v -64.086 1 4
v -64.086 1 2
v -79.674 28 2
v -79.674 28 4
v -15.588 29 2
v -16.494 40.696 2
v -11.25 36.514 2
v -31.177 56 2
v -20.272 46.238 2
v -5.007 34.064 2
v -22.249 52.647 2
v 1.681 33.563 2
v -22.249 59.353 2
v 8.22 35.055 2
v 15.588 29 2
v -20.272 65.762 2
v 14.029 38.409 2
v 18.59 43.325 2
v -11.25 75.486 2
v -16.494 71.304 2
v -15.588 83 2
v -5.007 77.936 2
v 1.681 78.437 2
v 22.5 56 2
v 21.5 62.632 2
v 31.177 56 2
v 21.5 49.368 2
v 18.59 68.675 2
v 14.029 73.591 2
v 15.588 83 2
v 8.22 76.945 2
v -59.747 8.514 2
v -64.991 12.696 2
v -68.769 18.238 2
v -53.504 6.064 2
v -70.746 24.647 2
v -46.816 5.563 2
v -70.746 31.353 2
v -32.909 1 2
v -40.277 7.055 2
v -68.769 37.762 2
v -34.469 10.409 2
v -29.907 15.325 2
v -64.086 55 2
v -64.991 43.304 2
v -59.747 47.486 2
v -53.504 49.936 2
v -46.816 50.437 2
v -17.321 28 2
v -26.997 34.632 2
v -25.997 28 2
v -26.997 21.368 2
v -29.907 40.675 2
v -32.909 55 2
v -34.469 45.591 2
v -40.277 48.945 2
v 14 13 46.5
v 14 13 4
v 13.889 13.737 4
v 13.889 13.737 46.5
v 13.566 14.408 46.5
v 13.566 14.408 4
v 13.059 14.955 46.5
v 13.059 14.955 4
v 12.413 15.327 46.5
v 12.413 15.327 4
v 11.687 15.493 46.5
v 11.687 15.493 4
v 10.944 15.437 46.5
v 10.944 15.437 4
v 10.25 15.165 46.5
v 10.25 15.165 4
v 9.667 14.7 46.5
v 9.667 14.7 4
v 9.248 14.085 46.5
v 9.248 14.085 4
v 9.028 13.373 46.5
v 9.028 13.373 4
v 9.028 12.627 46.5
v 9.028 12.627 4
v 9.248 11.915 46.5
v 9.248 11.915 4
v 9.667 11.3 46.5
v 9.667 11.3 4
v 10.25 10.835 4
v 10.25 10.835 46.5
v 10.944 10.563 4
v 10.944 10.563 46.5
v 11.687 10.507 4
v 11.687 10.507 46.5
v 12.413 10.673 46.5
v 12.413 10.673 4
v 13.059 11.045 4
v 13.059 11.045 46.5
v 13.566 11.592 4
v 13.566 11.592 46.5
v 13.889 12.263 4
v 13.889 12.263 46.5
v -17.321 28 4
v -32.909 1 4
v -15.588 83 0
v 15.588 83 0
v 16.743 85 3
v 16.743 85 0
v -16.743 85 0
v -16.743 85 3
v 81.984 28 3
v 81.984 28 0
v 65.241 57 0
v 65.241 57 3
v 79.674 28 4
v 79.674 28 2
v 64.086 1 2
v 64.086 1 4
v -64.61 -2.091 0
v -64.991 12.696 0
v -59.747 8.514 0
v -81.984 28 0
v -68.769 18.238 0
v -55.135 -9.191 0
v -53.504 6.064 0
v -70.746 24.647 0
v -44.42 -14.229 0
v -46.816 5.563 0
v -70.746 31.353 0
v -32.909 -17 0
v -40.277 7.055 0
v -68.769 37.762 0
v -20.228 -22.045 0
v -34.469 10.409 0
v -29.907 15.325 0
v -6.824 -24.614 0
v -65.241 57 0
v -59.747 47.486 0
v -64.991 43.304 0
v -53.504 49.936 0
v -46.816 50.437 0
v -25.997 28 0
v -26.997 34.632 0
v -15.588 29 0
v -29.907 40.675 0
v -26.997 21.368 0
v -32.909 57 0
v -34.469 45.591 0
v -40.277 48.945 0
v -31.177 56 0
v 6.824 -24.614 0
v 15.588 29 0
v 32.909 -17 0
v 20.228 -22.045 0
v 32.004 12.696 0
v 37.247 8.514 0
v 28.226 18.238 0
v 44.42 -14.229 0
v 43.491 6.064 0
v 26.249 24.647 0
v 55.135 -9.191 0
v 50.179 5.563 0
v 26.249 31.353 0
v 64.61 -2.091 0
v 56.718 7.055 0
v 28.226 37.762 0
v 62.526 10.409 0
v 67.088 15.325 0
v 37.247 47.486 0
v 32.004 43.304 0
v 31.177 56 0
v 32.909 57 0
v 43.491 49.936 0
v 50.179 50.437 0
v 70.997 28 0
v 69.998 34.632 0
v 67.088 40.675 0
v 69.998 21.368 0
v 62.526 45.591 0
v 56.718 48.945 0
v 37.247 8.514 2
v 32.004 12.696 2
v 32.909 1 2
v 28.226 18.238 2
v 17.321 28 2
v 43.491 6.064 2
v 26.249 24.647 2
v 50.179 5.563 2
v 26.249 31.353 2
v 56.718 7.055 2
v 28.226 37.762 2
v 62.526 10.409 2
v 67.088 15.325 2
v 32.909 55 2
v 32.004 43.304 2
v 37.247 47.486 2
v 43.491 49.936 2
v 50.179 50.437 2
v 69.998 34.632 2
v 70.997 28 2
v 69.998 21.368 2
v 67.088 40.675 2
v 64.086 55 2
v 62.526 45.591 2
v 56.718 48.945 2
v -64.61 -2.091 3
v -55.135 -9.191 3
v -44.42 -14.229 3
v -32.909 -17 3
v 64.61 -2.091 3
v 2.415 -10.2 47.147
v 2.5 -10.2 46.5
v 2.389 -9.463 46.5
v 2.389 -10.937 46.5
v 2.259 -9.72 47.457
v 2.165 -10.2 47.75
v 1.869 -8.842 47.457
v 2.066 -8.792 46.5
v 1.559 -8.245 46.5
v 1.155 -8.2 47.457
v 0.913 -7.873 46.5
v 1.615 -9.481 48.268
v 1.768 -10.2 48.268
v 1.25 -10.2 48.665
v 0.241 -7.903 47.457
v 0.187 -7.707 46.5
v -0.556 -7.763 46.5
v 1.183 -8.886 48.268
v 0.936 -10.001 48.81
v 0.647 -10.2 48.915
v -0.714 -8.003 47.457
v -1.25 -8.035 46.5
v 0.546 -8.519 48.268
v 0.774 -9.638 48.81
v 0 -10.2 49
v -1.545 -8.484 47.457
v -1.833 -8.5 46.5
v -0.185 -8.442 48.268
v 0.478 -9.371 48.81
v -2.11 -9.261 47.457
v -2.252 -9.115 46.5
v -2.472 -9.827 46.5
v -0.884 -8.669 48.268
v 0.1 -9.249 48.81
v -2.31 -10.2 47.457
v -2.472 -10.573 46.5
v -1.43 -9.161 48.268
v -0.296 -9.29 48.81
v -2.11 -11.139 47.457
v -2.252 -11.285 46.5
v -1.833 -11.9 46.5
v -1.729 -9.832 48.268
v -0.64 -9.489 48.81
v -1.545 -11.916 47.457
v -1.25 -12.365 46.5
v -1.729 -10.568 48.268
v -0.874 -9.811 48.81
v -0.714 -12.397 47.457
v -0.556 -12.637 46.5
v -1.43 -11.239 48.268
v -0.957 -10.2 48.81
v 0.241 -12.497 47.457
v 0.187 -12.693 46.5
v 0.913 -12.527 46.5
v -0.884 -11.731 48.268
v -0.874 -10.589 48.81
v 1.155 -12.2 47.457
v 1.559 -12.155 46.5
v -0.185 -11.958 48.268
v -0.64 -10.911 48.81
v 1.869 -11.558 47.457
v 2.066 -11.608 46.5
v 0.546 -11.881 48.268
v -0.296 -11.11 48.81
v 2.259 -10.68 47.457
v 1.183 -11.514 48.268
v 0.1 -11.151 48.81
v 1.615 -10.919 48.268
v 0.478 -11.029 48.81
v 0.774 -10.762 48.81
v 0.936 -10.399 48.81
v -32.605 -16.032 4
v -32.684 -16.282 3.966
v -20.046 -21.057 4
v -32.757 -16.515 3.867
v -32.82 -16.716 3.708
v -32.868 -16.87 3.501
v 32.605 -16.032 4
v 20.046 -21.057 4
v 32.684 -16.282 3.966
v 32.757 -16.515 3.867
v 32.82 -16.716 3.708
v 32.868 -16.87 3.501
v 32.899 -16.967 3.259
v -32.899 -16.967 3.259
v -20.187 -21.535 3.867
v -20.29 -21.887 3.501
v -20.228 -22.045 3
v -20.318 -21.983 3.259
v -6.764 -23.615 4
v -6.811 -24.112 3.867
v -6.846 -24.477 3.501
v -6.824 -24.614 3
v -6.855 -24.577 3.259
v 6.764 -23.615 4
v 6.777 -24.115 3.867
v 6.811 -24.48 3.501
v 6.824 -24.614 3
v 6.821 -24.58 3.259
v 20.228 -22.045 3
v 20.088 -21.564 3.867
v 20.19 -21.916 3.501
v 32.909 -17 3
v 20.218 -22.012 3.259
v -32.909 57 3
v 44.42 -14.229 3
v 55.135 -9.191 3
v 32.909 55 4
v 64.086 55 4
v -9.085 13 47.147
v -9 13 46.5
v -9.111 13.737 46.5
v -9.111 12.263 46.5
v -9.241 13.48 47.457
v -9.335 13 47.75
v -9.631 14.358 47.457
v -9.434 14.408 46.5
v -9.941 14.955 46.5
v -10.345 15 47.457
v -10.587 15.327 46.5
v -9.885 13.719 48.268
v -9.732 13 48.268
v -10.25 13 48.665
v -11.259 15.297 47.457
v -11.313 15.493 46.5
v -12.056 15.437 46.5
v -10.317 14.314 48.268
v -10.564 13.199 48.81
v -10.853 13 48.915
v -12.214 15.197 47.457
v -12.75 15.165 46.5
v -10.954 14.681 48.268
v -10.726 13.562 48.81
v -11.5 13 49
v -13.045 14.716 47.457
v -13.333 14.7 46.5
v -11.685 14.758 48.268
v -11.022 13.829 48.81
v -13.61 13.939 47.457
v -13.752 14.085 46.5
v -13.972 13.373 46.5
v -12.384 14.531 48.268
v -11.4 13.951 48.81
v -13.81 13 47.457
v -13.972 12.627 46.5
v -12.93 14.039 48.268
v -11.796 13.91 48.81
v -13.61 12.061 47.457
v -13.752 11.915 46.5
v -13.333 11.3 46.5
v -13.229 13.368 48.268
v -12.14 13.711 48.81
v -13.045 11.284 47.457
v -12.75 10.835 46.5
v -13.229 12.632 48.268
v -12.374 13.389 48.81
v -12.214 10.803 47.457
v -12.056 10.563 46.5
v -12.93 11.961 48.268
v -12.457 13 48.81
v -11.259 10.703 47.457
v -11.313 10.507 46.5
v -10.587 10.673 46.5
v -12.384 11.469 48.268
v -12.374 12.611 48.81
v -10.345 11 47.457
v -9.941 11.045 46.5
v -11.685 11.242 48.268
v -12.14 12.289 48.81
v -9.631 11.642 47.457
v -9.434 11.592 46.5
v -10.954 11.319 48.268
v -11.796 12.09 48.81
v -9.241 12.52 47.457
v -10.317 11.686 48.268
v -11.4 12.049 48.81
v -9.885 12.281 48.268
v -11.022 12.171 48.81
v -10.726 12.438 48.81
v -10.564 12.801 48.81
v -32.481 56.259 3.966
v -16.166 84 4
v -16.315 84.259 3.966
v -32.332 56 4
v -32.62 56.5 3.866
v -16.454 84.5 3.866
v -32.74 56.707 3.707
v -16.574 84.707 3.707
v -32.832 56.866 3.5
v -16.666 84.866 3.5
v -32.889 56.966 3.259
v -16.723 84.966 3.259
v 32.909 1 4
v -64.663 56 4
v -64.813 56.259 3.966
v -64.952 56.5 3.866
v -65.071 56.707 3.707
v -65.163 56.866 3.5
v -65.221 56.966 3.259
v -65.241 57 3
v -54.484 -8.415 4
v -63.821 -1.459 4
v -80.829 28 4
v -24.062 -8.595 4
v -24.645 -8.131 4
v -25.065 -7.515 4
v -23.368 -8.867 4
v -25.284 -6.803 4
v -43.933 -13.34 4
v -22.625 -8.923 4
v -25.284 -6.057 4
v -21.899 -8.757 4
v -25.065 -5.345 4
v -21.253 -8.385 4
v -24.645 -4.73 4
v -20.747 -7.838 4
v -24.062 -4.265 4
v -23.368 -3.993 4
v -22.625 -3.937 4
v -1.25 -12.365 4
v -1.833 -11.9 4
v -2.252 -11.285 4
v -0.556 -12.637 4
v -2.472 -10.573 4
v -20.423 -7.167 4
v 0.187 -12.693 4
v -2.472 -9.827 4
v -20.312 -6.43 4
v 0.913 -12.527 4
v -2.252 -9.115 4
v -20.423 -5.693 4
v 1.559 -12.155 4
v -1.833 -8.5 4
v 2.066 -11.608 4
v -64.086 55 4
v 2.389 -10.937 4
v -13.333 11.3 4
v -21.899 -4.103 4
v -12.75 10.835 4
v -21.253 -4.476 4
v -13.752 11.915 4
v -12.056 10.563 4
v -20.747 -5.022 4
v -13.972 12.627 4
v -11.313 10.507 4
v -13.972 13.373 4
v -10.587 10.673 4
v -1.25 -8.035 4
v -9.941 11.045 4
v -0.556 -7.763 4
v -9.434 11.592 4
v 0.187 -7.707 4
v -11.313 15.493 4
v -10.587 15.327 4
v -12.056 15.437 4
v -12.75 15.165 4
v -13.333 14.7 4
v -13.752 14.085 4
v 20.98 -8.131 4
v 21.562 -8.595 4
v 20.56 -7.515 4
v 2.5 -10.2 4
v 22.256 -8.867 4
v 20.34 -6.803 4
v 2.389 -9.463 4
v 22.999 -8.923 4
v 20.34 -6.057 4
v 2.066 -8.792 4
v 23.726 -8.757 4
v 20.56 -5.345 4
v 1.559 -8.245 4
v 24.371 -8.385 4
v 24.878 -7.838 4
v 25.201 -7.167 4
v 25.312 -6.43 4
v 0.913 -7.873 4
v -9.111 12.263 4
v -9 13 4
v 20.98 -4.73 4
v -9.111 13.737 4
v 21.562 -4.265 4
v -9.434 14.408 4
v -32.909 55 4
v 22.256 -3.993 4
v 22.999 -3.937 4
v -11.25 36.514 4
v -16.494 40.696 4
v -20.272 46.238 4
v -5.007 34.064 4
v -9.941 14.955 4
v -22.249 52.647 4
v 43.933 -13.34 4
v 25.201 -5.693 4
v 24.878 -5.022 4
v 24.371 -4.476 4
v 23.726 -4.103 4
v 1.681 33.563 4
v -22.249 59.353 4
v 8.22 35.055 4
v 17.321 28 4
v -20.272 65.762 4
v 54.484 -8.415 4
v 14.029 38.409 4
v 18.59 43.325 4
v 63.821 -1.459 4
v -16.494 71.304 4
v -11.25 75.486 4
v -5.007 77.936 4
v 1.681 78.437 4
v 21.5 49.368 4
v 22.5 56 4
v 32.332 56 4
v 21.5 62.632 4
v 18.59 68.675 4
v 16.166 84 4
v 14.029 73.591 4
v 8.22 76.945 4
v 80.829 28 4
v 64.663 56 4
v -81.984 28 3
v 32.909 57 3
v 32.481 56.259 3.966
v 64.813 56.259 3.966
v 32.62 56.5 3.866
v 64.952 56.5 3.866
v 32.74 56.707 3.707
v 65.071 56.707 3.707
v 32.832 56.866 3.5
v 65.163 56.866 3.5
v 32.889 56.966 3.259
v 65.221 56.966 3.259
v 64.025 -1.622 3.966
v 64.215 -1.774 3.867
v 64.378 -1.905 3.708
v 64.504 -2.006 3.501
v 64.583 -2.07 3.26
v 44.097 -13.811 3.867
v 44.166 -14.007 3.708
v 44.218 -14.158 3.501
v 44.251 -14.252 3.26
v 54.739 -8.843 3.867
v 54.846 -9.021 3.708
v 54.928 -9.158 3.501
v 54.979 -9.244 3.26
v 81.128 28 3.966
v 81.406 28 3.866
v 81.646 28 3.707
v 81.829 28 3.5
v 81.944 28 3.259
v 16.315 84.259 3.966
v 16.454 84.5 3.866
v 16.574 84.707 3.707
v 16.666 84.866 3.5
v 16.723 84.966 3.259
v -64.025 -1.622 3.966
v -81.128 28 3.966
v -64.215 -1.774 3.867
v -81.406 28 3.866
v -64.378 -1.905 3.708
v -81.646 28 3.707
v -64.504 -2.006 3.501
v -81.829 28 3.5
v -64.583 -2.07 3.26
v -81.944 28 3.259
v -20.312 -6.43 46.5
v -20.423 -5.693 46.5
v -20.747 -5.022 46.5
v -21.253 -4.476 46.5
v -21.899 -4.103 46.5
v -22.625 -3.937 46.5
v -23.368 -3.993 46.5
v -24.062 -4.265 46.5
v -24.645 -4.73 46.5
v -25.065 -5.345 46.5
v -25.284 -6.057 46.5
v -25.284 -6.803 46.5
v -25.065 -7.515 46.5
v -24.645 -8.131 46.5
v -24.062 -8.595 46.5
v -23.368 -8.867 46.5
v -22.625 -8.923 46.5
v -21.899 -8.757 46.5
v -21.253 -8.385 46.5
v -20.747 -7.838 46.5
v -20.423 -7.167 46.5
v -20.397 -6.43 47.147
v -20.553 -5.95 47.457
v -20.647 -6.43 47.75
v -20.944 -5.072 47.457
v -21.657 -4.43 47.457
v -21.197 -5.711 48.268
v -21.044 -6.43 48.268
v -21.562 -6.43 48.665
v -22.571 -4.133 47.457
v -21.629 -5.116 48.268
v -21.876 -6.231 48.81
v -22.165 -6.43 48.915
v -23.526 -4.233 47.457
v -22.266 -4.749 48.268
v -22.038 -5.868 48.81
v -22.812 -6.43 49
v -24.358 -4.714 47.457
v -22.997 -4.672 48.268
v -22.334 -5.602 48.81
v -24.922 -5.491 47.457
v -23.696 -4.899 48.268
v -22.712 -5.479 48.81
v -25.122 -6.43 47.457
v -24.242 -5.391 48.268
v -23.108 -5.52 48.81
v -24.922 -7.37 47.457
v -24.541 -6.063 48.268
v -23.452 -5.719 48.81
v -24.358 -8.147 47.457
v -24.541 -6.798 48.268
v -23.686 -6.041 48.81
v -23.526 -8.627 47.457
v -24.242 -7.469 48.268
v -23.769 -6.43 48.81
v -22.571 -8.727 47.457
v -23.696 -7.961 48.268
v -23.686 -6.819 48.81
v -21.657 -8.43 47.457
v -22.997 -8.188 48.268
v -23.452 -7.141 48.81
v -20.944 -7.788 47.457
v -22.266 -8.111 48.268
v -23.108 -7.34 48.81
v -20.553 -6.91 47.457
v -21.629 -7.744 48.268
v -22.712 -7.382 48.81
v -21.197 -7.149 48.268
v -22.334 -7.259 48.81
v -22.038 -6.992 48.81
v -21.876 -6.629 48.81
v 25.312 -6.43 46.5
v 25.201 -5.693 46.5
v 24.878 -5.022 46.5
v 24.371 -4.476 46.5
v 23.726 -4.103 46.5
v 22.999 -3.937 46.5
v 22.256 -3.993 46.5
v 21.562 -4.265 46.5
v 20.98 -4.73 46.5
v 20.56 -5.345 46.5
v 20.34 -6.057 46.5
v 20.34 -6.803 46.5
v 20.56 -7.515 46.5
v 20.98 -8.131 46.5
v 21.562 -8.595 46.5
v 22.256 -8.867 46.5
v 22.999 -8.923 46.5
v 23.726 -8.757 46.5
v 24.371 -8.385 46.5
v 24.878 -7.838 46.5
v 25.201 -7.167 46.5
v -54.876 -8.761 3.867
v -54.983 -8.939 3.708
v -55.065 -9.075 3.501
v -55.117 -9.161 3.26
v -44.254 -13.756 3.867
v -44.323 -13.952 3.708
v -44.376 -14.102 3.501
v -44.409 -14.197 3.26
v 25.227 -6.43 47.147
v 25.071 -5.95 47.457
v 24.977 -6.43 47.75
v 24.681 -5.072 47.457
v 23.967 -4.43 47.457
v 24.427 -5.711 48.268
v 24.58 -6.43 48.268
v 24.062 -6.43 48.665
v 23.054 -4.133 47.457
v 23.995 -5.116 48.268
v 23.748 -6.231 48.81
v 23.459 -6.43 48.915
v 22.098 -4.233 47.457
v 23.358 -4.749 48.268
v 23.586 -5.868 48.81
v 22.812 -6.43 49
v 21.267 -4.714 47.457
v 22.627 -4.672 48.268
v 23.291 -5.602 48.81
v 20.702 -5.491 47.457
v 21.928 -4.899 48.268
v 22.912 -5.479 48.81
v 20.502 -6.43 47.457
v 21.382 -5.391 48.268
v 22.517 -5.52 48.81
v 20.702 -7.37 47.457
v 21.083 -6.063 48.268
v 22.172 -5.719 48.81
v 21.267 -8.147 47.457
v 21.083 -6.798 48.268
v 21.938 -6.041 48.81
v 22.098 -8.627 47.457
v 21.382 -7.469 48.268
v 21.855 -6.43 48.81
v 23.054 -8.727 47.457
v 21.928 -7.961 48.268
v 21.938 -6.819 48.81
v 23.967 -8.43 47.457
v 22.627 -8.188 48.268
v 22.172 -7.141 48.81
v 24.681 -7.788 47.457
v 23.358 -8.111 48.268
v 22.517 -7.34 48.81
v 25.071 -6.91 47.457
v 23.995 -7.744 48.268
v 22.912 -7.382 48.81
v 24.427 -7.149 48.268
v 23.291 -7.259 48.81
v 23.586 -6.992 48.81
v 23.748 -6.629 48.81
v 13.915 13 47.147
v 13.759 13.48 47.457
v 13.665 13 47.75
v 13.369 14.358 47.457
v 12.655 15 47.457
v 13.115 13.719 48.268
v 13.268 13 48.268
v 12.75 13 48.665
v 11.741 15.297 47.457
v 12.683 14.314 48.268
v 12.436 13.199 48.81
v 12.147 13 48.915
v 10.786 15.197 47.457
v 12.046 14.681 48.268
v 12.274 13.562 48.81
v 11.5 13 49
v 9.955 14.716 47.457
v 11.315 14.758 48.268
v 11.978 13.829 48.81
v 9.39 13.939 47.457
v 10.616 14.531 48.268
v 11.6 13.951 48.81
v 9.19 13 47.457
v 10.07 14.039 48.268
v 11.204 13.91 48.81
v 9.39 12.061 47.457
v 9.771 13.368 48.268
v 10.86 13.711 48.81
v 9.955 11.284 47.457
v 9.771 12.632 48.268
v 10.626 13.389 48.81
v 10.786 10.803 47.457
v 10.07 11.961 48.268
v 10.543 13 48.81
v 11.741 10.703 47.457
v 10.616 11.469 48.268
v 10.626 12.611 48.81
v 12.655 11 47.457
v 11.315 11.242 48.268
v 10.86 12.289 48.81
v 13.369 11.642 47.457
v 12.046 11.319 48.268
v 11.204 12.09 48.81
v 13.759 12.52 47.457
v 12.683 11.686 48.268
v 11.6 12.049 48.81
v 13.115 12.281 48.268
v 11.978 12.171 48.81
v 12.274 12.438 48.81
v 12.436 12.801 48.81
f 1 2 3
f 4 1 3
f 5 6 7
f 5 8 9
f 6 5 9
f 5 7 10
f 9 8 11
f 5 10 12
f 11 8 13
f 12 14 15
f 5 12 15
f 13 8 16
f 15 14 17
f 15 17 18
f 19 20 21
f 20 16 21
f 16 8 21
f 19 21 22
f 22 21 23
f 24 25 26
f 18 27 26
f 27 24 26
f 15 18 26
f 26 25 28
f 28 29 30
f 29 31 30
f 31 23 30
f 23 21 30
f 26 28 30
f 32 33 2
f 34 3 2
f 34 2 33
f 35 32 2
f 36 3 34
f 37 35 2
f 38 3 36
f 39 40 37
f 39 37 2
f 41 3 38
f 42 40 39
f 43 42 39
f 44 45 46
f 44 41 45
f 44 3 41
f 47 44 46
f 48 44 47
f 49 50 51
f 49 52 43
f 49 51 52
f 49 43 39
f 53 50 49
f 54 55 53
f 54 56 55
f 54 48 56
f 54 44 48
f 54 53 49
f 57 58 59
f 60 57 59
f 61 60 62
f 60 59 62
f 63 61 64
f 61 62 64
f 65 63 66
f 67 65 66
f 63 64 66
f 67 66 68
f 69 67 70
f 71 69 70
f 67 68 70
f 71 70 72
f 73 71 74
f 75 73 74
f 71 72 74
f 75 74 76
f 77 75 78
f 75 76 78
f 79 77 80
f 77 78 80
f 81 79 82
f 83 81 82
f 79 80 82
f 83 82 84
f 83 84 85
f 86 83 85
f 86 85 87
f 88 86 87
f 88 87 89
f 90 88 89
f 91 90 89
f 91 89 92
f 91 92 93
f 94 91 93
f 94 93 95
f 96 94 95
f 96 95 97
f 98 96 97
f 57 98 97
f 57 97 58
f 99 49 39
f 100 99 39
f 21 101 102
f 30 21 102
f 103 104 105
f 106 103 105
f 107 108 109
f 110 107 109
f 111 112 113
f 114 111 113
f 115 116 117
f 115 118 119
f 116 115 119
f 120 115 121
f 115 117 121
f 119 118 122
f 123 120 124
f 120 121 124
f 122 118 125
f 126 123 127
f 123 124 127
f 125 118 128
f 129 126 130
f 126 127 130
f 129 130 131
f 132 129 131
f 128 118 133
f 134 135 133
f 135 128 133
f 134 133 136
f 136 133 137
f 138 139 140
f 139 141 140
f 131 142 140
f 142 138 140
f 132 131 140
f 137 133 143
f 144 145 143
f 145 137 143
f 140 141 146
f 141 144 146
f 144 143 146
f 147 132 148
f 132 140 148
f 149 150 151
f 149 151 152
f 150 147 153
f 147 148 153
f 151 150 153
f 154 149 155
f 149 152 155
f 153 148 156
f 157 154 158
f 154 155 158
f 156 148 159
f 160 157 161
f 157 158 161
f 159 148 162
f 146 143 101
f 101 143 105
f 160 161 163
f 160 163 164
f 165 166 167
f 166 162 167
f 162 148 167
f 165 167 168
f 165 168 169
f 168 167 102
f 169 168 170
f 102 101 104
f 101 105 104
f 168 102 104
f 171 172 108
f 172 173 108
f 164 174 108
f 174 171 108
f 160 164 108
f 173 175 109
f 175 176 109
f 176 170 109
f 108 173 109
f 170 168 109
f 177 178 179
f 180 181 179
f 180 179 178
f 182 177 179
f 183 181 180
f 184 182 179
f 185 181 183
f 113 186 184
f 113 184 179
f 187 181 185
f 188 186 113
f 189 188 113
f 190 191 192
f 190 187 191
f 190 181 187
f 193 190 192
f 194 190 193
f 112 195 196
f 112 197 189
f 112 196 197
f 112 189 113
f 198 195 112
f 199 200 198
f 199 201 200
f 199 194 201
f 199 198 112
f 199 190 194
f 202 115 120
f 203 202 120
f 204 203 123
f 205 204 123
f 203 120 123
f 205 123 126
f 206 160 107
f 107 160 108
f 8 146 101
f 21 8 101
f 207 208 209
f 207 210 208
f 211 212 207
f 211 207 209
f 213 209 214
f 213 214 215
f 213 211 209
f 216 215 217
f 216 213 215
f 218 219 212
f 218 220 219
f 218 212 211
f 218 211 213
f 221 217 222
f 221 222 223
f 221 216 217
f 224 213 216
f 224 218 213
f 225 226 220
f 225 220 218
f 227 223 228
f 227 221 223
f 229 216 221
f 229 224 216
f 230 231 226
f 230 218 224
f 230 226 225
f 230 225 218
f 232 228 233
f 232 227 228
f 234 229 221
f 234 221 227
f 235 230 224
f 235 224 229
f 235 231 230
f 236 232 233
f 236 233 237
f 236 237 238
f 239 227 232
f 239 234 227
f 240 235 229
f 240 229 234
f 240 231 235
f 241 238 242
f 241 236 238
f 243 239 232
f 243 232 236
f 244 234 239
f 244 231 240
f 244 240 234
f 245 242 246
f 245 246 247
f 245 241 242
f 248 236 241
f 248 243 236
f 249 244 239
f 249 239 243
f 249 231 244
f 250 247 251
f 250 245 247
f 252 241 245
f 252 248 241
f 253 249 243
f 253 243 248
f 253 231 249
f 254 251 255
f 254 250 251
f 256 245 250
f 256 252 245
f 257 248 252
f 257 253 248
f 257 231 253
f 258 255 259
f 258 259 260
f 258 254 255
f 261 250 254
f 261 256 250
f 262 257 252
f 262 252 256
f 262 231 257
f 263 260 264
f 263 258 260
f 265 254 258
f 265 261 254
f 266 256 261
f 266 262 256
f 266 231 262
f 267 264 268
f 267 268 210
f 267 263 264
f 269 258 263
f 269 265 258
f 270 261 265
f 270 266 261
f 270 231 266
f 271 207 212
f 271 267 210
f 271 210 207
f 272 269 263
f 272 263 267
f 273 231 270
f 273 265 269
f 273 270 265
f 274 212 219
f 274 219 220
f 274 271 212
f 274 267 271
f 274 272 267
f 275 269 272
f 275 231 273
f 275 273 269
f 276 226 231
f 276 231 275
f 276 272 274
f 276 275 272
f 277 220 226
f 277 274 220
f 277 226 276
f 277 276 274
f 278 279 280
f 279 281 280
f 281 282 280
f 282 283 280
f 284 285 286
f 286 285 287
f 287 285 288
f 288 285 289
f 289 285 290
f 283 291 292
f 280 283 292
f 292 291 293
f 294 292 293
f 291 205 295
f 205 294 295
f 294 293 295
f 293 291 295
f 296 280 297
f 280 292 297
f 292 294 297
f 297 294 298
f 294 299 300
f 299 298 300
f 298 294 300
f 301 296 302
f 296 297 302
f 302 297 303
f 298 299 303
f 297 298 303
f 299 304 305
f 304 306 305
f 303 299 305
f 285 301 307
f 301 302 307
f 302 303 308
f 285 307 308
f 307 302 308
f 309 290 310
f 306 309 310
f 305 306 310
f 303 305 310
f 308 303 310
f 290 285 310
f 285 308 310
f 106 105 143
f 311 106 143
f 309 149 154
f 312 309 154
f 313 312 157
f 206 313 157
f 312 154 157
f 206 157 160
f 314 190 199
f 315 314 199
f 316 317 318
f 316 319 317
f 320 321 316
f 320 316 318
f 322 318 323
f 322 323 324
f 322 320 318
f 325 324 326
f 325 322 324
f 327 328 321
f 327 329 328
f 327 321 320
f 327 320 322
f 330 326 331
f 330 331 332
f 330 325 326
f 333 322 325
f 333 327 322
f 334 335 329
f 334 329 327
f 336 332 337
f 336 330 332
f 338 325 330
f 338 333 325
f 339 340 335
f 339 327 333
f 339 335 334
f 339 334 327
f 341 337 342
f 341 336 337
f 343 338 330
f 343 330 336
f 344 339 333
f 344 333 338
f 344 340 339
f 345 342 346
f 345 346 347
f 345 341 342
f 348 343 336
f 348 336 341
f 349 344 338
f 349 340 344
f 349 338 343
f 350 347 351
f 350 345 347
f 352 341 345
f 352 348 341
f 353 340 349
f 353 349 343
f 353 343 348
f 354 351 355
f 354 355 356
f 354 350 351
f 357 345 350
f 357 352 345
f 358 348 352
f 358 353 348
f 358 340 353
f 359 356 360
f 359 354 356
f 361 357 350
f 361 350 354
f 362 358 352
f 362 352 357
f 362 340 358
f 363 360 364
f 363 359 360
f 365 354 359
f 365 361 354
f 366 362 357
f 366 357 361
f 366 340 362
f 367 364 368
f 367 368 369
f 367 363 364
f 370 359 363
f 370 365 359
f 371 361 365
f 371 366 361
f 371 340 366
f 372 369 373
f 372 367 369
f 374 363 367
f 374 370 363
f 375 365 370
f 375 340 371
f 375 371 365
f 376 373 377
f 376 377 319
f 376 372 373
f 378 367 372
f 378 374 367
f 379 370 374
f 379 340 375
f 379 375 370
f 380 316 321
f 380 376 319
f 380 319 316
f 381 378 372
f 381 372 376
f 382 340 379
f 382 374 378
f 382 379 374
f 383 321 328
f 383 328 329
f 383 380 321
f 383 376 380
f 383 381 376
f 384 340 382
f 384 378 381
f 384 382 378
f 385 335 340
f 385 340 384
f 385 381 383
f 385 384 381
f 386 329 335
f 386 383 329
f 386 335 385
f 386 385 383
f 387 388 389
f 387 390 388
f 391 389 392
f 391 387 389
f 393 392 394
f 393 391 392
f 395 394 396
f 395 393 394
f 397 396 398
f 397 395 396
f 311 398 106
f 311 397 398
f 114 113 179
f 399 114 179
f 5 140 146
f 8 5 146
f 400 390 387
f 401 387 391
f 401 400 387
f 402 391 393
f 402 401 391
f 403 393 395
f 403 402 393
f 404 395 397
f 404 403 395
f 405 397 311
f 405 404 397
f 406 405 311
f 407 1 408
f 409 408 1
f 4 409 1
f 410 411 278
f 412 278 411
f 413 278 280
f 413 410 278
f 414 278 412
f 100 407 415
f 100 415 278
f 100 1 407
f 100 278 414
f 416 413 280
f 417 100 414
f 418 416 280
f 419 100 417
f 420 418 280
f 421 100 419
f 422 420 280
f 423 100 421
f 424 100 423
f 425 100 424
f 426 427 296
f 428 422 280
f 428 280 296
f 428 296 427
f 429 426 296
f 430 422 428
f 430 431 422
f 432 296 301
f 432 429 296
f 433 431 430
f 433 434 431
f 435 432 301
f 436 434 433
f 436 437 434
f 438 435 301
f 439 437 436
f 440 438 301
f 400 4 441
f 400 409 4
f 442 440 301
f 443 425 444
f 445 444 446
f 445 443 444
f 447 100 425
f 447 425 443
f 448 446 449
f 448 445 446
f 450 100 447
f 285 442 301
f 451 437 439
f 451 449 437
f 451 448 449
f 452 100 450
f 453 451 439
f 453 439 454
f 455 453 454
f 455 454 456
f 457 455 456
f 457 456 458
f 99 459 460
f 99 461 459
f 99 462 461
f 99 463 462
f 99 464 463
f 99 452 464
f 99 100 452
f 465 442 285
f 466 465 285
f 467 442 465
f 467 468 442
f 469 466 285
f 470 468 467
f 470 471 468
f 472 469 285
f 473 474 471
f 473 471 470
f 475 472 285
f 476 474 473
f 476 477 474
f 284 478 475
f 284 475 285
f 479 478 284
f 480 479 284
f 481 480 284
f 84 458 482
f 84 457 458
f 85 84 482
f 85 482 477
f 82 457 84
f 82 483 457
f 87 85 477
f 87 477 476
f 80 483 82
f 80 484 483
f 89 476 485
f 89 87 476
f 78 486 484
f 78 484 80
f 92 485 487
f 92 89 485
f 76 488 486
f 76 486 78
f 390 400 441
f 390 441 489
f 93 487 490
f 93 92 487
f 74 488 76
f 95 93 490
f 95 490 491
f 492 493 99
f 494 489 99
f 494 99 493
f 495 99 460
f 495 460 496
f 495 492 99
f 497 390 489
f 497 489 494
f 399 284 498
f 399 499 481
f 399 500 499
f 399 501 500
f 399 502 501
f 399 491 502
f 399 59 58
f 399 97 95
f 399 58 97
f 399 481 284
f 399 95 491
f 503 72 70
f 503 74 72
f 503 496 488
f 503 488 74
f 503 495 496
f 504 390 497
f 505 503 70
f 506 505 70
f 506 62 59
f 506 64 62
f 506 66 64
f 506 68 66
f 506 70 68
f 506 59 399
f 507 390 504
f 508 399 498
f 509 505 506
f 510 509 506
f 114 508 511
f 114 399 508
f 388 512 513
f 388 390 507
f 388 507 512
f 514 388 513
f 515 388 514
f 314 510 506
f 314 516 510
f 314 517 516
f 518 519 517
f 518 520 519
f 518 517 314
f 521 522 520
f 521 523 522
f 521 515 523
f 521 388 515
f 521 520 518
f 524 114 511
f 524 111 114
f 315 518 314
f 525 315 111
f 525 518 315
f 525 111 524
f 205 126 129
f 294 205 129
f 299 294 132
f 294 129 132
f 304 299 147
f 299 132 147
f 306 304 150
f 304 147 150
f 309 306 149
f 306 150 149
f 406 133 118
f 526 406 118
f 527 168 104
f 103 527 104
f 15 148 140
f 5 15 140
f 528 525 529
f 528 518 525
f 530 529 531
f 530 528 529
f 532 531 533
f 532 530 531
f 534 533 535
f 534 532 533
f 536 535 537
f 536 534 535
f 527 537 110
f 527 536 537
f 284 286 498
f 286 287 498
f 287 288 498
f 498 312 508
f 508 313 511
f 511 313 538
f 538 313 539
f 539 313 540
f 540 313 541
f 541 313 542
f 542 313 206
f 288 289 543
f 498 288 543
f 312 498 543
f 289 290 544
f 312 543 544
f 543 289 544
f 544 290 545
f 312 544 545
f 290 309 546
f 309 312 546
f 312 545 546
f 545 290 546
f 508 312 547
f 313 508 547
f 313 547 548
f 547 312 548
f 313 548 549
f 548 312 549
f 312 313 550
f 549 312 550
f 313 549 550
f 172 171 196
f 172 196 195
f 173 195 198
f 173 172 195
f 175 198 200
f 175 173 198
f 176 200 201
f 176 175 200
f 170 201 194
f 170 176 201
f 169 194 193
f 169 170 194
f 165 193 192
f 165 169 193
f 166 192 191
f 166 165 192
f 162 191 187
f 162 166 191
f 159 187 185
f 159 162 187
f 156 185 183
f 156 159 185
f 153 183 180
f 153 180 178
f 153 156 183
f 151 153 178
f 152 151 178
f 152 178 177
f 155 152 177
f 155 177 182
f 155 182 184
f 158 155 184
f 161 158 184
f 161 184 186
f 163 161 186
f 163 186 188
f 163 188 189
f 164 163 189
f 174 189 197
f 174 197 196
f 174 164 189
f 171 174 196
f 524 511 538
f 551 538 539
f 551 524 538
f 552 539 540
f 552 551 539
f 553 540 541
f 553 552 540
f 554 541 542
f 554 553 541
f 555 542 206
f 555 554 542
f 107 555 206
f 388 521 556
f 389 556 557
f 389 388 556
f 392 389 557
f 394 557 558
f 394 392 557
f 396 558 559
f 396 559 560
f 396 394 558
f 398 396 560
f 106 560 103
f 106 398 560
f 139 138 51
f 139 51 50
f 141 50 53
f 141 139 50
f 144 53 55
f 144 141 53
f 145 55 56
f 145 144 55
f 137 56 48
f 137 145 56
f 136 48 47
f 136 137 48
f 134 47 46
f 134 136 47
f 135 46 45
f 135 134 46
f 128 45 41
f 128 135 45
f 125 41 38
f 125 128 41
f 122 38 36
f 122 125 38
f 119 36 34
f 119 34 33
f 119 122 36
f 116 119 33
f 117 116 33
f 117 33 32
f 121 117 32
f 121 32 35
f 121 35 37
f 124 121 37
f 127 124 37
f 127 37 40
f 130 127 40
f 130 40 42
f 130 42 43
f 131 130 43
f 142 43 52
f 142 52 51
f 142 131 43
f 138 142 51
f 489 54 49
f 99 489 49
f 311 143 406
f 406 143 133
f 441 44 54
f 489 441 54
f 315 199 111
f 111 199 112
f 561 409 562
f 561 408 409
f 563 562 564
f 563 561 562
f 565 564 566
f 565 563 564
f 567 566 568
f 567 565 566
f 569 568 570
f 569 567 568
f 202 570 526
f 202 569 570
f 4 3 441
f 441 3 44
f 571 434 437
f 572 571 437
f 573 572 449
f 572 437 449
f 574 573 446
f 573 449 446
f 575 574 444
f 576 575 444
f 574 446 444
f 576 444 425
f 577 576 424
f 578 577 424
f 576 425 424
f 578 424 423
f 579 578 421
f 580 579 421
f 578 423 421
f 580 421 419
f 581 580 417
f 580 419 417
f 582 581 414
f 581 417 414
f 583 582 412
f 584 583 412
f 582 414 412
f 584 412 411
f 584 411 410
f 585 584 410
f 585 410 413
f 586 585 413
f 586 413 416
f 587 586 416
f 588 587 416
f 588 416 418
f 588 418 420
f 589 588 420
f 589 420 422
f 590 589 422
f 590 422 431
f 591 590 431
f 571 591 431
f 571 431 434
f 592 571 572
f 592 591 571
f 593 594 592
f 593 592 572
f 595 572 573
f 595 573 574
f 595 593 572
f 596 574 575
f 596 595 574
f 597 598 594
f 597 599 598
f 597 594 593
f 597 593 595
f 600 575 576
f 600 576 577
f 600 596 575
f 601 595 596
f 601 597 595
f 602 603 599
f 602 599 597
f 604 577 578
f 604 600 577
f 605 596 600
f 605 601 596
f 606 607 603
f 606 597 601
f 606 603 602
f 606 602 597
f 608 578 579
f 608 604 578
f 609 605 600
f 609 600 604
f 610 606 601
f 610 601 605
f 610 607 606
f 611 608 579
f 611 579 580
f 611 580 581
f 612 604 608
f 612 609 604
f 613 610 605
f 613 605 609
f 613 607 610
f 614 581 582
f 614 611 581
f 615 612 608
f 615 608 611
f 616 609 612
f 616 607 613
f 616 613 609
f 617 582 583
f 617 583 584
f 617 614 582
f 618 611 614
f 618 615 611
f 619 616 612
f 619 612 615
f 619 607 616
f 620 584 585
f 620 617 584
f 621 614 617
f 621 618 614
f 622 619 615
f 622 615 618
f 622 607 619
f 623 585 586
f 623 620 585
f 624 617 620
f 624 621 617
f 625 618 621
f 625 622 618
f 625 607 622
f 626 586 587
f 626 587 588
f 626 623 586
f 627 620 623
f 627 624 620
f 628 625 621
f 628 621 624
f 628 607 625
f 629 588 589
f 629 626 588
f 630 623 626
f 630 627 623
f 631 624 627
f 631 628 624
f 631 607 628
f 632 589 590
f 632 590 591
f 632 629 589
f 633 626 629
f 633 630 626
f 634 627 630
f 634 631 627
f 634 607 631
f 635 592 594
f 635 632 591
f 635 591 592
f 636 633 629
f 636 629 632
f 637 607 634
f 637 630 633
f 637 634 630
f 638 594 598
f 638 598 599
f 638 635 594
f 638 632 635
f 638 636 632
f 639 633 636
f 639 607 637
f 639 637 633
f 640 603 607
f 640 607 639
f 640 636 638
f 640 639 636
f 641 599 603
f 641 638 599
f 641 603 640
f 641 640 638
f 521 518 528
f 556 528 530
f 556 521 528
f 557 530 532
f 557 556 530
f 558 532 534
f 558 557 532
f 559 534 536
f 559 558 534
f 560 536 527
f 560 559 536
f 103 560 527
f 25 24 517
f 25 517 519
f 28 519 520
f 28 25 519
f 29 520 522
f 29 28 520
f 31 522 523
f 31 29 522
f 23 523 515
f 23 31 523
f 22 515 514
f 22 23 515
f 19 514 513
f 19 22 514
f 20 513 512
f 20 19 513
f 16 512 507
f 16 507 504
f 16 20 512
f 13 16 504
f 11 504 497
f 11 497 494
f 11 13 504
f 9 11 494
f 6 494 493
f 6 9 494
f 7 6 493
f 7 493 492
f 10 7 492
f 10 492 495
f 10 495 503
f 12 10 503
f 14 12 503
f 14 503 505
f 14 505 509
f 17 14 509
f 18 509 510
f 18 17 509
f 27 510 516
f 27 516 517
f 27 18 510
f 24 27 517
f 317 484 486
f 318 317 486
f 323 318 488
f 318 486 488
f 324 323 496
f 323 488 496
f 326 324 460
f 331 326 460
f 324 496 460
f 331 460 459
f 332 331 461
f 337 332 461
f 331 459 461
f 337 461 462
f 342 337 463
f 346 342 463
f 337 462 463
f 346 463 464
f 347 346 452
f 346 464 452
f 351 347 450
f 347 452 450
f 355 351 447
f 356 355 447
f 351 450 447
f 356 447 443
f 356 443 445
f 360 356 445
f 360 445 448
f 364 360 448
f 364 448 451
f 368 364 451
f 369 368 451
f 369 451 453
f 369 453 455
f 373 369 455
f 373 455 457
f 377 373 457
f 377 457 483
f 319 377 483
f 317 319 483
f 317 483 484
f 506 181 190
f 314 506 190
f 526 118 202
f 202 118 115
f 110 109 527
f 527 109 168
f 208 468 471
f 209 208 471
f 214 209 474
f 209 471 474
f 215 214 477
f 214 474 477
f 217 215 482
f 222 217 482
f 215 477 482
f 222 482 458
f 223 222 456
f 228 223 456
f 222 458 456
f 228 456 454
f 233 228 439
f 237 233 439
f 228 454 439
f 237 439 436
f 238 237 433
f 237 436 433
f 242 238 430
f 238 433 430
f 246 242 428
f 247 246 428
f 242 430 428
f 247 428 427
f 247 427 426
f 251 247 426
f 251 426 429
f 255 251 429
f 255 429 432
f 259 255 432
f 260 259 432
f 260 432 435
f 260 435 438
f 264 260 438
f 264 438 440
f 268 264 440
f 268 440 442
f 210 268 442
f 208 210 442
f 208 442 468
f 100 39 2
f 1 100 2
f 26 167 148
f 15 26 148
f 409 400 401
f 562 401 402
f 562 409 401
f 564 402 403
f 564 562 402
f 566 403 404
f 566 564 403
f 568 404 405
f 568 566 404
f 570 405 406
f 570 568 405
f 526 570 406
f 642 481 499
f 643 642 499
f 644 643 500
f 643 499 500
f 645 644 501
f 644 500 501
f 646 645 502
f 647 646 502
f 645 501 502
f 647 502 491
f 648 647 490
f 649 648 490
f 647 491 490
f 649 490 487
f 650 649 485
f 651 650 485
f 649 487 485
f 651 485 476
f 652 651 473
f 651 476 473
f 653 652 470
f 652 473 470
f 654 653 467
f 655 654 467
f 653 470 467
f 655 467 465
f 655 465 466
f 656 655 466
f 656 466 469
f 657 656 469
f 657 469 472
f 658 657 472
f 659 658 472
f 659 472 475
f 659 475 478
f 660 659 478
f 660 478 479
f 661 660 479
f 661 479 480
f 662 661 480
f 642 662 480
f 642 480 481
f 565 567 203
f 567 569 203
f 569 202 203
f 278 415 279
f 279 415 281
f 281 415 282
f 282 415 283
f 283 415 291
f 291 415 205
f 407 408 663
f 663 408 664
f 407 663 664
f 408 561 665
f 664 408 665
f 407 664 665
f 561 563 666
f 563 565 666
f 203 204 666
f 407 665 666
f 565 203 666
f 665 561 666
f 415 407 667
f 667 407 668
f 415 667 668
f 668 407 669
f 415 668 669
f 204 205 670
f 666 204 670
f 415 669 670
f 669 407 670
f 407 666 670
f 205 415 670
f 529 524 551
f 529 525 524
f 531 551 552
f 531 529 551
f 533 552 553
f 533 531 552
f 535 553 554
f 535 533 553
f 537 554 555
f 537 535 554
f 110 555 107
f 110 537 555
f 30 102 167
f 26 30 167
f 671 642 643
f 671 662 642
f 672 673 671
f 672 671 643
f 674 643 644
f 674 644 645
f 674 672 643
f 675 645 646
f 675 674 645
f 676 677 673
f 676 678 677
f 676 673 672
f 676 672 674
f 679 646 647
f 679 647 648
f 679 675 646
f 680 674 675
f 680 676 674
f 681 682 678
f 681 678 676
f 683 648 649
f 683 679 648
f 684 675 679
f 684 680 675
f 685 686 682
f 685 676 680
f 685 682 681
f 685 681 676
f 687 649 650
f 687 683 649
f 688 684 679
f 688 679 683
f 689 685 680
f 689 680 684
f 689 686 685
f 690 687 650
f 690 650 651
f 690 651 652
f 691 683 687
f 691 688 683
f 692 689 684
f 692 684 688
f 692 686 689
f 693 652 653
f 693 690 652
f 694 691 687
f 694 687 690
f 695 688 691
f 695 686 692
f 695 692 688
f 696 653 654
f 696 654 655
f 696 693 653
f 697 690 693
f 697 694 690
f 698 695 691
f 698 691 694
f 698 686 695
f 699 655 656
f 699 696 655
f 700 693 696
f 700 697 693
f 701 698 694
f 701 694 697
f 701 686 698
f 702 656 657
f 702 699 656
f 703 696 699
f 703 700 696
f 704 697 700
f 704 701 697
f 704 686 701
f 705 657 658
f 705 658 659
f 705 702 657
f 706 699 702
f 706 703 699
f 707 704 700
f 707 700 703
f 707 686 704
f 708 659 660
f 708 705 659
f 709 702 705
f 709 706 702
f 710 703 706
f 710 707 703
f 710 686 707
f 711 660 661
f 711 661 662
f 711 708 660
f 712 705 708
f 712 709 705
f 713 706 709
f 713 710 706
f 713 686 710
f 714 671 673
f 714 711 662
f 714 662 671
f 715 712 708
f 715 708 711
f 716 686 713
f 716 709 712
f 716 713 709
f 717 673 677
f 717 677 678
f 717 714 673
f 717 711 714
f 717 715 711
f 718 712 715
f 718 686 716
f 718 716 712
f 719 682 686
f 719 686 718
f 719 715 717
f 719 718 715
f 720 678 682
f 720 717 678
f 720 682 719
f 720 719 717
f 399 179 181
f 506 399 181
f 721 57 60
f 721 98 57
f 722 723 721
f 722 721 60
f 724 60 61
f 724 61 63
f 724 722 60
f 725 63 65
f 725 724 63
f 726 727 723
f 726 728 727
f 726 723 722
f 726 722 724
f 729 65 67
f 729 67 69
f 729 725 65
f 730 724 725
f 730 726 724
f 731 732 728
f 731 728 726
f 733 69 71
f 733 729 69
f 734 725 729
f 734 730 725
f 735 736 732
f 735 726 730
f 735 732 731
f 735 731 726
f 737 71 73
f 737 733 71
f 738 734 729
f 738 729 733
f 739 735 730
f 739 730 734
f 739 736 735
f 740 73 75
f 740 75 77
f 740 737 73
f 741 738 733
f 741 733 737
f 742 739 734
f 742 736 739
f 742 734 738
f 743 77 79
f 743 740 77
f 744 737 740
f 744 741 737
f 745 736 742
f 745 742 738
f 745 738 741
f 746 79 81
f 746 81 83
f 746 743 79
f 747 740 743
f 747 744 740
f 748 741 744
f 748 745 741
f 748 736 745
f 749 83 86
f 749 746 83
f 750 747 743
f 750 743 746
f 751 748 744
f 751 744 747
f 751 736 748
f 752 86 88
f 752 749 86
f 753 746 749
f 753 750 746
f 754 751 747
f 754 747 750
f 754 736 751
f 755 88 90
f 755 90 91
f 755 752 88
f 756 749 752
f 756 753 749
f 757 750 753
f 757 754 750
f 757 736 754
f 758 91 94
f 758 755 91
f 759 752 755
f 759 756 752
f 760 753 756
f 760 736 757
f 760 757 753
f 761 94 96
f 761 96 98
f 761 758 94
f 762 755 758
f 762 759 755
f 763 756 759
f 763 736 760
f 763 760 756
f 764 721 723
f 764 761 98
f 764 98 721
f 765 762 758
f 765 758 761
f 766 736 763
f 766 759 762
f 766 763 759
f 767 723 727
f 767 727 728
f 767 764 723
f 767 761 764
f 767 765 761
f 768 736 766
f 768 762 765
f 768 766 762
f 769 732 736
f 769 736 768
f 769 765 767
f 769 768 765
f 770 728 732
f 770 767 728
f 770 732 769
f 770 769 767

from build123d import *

# Parameters (mm, degrees)
F0_R     = 2.5
F0_R_2   = 22.5
F1_DEPTH = 2
F2_DEPTH = 4
F3_DEPTH = 49
F4_START = 2
F4_DEPTH = 2
F5_R     = 2.5
F6_R     = 1


with BuildPart() as f1:
    # F0 (on Top) → F1 (new body)
    with BuildSketch(Plane.XY):
        with BuildLine():
            ThreePointArc((-64.6104820835, -2.0913623334), (-49.905732642, -11.9825383792), (-32.9089653438, -17))
            ThreePointArc((-32.9089653438, -17), (0, -24.9371242498), (32.9089653438, -17))
            ThreePointArc((32.9089653438, -17), (49.905732642, -11.9825383792), (64.6104820835, -2.0913623334))
            Line((64.6104820835, -2.0913623334), (81.9837382259, 27.9999999982))
            Line((81.9837382291, 27.9999999928), (65.2405804184, 57))
            Line((65.2405804184, 57), (32.9089653438, 57))
            Line((32.9089653438, 57), (16.7431578065, 85))
            Line((16.7431578065, 85), (-16.7431578065, 85))
            Line((-16.7431578065, 85), (-32.9089653438, 57))
            Line((-32.9089653438, 57), (-65.2405804184, 57))
            Line((-65.2405804184, 57), (-81.9837382259, 27.9999999982))
            Line((-81.9837382259, 27.9999999982), (-64.6104820835, -2.0913623334))
        make_face()
        with Locations((-22.8121797535, -6.4300971625)):
            Circle(F0_R, mode=Mode.SUBTRACT)
        Polygon((-79.6743371482, 28), (-64.08587988, 55), (-32.9089653438, 55), (-17.3205080757, 28), (-32.9089653438, 1), (-64.08587988, 1), align=None, mode=Mode.SUBTRACT)
        with Locations((-11.5, 13)):
            Circle(F0_R, mode=Mode.SUBTRACT)
        with Locations((0, -10.200026891)):
            Circle(F0_R, mode=Mode.SUBTRACT)
        with Locations((22.8121797535, -6.4300971625)):
            Circle(F0_R, mode=Mode.SUBTRACT)
        with Locations((11.5, 13)):
            Circle(F0_R, mode=Mode.SUBTRACT)
        Polygon((64.08587988, 1), (32.9089653438, 1), (17.3205080757, 28), (32.9089653438, 55), (64.08587988, 55), (79.6743371482, 28), align=None, mode=Mode.SUBTRACT)
        Polygon((-31.1769145362, 56), (-15.5884572681, 83), (15.5884572681, 83), (31.1769145362, 56), (15.5884572681, 29), (-15.5884572681, 29), align=None, mode=Mode.SUBTRACT)
        Polygon((-32.9089653438, 55), (-64.08587988, 55), (-79.6743371482, 28), (-64.08587988, 1), (-32.9089653438, 1), (-17.3205080757, 28), align=None)
        with Locations((-48.4974226119, 28)):
            Circle(F0_R_2, mode=Mode.SUBTRACT)
        Polygon((17.3205080757, 28), (32.9089653438, 1), (64.08587988, 1), (79.6743371482, 28), (64.08587988, 55), (32.9089653438, 55), align=None)
        with Locations((48.4974226119, 28)):
            Circle(F0_R_2, mode=Mode.SUBTRACT)
    extrude(amount=F1_DEPTH)

    # F0 (on Top) → F2 (join)
    with BuildSketch(Plane.XY):
        with BuildLine():
            ThreePointArc((-64.6104820835, -2.0913623334), (-49.905732642, -11.9825383792), (-32.9089653438, -17))
            ThreePointArc((-32.9089653438, -17), (0, -24.9371242498), (32.9089653438, -17))
            ThreePointArc((32.9089653438, -17), (49.905732642, -11.9825383792), (64.6104820835, -2.0913623334))
            Line((64.6104820835, -2.0913623334), (81.9837382259, 27.9999999982))
            Line((81.9837382291, 27.9999999928), (65.2405804184, 57))
            Line((65.2405804184, 57), (32.9089653438, 57))
            Line((32.9089653438, 57), (16.7431578065, 85))
            Line((16.7431578065, 85), (-16.7431578065, 85))
            Line((-16.7431578065, 85), (-32.9089653438, 57))
            Line((-32.9089653438, 57), (-65.2405804184, 57))
            Line((-65.2405804184, 57), (-81.9837382259, 27.9999999982))
            Line((-81.9837382259, 27.9999999982), (-64.6104820835, -2.0913623334))
        make_face()
        with Locations((-22.8121797535, -6.4300971625)):
            Circle(F0_R, mode=Mode.SUBTRACT)
        Polygon((-79.6743371482, 28), (-64.08587988, 55), (-32.9089653438, 55), (-17.3205080757, 28), (-32.9089653438, 1), (-64.08587988, 1), align=None, mode=Mode.SUBTRACT)
        with Locations((-11.5, 13)):
            Circle(F0_R, mode=Mode.SUBTRACT)
        with Locations((0, -10.200026891)):
            Circle(F0_R, mode=Mode.SUBTRACT)
        with Locations((22.8121797535, -6.4300971625)):
            Circle(F0_R, mode=Mode.SUBTRACT)
        with Locations((11.5, 13)):
            Circle(F0_R, mode=Mode.SUBTRACT)
        Polygon((64.08587988, 1), (32.9089653438, 1), (17.3205080757, 28), (32.9089653438, 55), (64.08587988, 55), (79.6743371482, 28), align=None, mode=Mode.SUBTRACT)
        Polygon((-31.1769145362, 56), (-15.5884572681, 83), (15.5884572681, 83), (31.1769145362, 56), (15.5884572681, 29), (-15.5884572681, 29), align=None, mode=Mode.SUBTRACT)
    extrude(amount=F2_DEPTH)

    # F0 (on Top) → F3 (join)
    with BuildSketch(Plane.XY):
        with Locations((-11.5, 13)):
            Circle(F0_R)
        with Locations((11.5, 13)):
            Circle(F0_R)
        with Locations((-22.8121797535, -6.4300971625)):
            Circle(F0_R)
        with Locations((0, -10.200026891)):
            Circle(F0_R)
        with Locations((22.8121797535, -6.4300971625)):
            Circle(F0_R)
    extrude(amount=F3_DEPTH)

    # F0 (on Top) → F4 (join)
    with BuildSketch(Plane.XY.offset(F4_START)):
        Polygon((15.5884572681, 83), (-15.5884572681, 83), (-31.1769145362, 56), (-15.5884572681, 29), (15.5884572681, 29), (31.1769145362, 56), align=None)
        with Locations((0, 56)):
            Circle(F0_R_2, mode=Mode.SUBTRACT)
    extrude(amount=F4_DEPTH)

    # F5
    f5_edges = [f1.edges().sort_by_distance(p)[0] for p in [
        (-25.31218, -6.430097, 49),
        (-14, 13, 49),
        (9, 13, 49),
        (20.31218, -6.430097, 49),
        (-2.5, -10.200027, 49),
    ]]
    fillet(f5_edges, radius=F5_R)

    # F6
    f6_edges = [f1.edges().sort_by_distance(p)[0] for p in [
        (-73.29711, 12.954319, 4),
        (-49.905733, -11.982538, 4),
        (0, -24.937124, 4),
        (49.905733, -11.982538, 4),
        (73.29711, 12.954319, 4),
        (73.612159, 42.5, 4),
        (49.074773, 57, 4),
        (24.826062, 71, 4),
        (0, 85, 4),
        (-24.826062, 71, 4),
        (-49.074773, 57, 4),
        (-73.612159, 42.5, 4),
    ]]
    fillet(f6_edges, radius=F6_R)


solid = f1.part
